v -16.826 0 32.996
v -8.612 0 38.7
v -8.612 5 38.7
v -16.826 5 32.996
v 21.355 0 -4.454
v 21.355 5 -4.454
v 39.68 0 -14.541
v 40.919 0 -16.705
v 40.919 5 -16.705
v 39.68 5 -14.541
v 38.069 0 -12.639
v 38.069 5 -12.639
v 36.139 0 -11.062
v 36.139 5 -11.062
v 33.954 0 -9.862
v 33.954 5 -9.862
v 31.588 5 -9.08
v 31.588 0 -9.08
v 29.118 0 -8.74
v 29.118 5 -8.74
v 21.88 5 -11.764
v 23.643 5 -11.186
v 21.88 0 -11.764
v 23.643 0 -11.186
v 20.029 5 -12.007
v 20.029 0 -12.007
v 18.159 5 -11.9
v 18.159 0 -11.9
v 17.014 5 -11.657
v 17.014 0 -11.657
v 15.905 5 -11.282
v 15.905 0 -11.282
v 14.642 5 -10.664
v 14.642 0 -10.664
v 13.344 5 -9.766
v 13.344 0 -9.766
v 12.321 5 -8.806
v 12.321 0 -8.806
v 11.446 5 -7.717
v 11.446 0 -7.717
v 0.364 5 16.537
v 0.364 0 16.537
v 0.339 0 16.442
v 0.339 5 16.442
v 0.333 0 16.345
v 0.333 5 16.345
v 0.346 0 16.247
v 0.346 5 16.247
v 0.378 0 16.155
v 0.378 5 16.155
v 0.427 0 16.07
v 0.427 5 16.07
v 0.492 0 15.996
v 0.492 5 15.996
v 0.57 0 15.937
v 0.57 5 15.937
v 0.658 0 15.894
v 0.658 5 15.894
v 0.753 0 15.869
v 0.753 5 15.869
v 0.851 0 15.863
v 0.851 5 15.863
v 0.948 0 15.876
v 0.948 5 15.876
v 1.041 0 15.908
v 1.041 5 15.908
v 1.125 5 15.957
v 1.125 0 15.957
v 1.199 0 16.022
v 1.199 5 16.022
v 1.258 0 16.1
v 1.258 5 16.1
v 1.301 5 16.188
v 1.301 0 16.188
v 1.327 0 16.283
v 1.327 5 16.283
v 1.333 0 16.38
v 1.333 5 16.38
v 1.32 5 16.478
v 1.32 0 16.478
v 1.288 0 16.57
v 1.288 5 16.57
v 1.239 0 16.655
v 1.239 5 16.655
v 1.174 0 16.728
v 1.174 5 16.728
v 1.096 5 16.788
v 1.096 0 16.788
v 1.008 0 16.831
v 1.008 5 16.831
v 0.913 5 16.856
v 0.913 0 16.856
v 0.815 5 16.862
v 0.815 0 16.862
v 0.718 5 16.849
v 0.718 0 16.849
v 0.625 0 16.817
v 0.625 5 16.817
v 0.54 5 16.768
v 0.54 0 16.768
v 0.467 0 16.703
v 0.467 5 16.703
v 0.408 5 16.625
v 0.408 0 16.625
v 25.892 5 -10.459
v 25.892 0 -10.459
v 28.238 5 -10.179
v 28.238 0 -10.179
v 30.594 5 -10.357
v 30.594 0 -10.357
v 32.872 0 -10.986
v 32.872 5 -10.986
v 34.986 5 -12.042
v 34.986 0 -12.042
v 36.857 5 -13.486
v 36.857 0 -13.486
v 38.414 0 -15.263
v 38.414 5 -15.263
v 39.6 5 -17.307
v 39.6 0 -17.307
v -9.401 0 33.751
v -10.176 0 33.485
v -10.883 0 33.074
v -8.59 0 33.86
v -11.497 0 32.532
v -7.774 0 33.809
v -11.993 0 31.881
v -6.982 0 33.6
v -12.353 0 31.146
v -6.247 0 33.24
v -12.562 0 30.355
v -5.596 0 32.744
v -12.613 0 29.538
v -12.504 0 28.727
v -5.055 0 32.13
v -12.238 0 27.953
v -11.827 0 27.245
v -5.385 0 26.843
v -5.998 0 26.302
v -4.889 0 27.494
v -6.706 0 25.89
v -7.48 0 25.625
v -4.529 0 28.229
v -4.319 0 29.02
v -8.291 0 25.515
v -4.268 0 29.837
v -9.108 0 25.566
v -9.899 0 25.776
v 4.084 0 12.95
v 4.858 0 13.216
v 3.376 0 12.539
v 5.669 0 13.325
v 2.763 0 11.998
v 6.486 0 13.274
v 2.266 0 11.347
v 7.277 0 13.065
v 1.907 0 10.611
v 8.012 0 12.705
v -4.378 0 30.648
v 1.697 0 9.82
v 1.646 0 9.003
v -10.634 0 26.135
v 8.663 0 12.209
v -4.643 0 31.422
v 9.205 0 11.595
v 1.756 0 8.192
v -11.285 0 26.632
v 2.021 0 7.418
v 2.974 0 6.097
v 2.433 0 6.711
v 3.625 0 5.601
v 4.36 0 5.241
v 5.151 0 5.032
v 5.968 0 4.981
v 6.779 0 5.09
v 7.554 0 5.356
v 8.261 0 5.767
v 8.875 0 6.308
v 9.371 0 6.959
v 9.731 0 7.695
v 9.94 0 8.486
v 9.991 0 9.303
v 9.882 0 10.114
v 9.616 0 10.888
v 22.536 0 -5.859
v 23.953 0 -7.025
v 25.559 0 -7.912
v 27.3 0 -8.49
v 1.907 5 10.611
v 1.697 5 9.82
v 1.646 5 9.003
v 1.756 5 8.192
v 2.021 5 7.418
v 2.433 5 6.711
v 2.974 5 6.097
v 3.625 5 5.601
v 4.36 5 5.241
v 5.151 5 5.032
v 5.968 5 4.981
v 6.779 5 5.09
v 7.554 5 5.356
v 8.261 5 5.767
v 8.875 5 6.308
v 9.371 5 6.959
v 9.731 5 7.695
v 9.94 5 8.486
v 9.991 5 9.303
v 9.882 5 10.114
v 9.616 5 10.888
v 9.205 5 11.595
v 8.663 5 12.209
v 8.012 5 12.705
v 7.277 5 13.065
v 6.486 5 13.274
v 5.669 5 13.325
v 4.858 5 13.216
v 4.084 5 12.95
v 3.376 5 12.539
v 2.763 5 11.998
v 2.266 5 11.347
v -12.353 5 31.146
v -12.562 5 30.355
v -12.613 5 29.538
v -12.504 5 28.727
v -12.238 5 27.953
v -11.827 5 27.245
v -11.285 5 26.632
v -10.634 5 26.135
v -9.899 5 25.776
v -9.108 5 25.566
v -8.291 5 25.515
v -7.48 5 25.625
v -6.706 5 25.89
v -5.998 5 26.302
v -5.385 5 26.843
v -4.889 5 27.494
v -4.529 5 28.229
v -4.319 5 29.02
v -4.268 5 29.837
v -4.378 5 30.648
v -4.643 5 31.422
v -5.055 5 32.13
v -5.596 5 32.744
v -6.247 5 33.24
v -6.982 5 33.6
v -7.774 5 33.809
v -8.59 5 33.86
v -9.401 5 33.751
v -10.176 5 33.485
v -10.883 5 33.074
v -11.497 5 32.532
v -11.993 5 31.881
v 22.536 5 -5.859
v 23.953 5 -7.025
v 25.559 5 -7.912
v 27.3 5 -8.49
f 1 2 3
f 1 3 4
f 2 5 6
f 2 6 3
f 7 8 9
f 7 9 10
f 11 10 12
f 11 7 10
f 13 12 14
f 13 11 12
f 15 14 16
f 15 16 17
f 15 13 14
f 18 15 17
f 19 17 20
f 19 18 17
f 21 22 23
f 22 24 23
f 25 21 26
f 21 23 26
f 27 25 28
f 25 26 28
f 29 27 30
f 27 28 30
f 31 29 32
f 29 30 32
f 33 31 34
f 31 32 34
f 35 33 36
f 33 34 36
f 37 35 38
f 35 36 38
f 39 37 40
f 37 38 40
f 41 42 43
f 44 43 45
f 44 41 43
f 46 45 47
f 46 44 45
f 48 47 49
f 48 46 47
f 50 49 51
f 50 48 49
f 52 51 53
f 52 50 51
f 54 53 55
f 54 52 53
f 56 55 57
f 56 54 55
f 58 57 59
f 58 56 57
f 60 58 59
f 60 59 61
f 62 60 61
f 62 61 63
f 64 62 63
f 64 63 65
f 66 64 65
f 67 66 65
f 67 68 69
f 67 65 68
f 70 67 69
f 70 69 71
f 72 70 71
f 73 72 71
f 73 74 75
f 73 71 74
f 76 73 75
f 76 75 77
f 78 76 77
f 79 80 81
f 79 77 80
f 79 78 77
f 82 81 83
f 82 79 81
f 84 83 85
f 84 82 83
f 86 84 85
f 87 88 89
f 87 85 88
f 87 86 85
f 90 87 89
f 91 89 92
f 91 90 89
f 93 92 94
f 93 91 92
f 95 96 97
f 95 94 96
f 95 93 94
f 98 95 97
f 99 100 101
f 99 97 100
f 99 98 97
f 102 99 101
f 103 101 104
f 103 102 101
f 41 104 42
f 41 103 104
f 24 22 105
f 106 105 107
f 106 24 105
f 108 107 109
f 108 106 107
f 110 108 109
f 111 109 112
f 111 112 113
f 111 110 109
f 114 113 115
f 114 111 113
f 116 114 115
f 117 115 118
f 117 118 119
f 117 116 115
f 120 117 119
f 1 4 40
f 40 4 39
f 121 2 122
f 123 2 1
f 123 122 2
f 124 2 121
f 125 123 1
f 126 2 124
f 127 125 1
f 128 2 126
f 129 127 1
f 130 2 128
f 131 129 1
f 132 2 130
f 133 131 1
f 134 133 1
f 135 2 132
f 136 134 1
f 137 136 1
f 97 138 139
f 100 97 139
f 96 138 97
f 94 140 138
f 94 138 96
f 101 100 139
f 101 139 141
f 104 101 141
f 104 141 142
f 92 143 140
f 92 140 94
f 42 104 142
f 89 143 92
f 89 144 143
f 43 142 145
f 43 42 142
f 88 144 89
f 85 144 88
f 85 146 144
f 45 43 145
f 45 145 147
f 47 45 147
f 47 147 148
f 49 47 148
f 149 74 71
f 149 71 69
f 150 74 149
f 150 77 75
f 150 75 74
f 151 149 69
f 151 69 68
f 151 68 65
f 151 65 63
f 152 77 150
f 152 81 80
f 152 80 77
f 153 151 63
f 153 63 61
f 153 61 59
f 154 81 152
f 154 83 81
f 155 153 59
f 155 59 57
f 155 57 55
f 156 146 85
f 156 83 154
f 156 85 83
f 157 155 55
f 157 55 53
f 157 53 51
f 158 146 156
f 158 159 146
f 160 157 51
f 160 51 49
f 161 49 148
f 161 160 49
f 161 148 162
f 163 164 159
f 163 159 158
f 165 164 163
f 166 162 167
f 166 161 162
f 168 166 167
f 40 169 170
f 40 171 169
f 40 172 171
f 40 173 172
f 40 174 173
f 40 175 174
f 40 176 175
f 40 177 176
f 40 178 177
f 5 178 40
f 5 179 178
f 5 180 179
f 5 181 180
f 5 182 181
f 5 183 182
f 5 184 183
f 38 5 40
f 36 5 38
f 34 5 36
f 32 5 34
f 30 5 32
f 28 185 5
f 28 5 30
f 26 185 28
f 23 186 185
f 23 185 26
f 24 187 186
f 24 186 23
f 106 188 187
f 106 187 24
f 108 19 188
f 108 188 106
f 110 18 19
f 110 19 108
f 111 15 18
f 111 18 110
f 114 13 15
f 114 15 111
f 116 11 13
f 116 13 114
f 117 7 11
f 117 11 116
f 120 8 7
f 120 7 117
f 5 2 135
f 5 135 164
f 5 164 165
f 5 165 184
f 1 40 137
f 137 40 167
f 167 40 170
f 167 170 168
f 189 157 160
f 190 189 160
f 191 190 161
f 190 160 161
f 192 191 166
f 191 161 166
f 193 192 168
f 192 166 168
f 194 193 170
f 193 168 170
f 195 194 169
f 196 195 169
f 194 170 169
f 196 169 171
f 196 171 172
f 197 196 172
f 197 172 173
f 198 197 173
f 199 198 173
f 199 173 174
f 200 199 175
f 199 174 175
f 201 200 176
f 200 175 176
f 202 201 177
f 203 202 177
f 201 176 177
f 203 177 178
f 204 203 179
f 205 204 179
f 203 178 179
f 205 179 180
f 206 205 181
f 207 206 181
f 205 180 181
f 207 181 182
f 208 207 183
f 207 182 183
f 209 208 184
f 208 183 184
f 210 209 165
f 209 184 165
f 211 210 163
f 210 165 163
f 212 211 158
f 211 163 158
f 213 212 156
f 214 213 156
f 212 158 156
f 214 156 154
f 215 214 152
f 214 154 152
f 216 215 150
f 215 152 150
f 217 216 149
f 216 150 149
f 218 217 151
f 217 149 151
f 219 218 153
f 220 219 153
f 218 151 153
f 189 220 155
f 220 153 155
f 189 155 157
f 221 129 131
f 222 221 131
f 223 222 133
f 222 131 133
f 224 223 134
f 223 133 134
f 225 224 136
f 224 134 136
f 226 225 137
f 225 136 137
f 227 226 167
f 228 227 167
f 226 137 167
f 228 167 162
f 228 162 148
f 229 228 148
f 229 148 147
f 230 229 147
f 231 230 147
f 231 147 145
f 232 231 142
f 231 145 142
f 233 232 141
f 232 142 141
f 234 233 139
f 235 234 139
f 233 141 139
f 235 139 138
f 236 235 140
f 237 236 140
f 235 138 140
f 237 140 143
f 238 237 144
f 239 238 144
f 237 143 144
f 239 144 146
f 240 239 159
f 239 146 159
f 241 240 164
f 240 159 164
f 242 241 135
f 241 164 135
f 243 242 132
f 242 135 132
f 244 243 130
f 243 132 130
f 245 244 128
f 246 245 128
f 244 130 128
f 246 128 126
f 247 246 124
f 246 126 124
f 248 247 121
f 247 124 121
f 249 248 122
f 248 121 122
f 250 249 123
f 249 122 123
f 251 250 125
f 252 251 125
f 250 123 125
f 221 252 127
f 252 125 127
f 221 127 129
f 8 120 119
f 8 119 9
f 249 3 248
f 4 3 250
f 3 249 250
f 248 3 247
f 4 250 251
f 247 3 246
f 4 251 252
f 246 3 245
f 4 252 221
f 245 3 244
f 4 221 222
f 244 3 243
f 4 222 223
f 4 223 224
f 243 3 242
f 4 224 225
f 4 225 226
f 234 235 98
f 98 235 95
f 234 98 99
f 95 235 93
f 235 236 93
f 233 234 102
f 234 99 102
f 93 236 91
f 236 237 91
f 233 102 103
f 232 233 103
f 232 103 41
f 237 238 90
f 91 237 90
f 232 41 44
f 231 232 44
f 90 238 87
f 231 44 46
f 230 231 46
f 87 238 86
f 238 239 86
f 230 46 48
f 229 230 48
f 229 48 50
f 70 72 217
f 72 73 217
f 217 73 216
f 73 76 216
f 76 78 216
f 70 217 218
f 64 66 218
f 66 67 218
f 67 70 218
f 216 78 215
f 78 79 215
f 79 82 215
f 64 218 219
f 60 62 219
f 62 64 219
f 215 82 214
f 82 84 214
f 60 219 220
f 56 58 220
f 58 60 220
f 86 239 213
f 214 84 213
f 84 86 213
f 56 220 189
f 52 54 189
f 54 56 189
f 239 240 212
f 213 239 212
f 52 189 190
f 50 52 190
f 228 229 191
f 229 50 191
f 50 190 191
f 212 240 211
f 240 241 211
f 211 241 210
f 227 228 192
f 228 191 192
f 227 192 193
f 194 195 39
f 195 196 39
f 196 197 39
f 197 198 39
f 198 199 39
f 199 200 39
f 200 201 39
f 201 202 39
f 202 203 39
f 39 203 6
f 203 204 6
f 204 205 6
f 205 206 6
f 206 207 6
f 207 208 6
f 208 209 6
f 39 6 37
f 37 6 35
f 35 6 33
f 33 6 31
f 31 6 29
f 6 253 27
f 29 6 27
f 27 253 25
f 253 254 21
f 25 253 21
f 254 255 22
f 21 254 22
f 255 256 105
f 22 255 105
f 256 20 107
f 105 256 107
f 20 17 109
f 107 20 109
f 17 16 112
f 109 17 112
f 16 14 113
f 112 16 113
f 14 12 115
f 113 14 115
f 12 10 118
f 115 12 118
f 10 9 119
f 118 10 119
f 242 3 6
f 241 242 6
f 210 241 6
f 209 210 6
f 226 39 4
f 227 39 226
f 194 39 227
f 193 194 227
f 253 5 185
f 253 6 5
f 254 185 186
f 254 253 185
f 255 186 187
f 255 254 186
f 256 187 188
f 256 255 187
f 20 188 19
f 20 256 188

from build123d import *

# Parameters (mm, degrees)
SKETCH_2_R          = 4.175
EXTRUDE_1_DEPTH     = 5
FILLET_1_R          = 20
SKETCH_6_R          = 0.5000000000000009
CUT_EXTRUDE_3_DEPTH = 47.17452492507412
FILLET_2_R          = 10
CUT_EXTRUDE_4_DEPTH = 57.542041070345505
FILLET_3_R          = 10


with BuildPart() as part:
    # ｽｹｯﾁ2 → ﾎﾞｽ - 押し出し1 (new body)
    with BuildSketch(Plane(origin=(0, 0, 0), x_dir=(1, 0, 0), z_dir=(0, 1, 0))):
        with BuildLine():
            Line((8.269872578160966, 20.67530348178248), (-25.039362549658698, -27.29226699202151))
            Line((-25.039362549658694, -27.292266992021514), (-16.82553632293364, -32.996042821869985))
            Line((-16.82553632293364, -32.996042821869985), (16.77540554807104, 15.391605258271007))
            ThreePointArc((16.775405548070047, 15.39160525826554), (17.036467269075846, 15.346625845237856), (17.298352710232226, 15.306721140237647))
            Line((17.29835271023301, 15.306721140243175), (12.453720459223167, 18.670889747549086))
            ThreePointArc((12.453720459220065, 18.67088974754445), (7.082723548852389, 27.619577165201054), (10.596791286456618, 37.44698487250789))
            Line((10.596791286456803, 37.44698487250808), (9.571486453740173, 38.47228970522472))
            ThreePointArc((9.571486453736274, 38.47228970522862), (5.609855036074267, 29.81593956245965), (8.269872578156503, 20.675303481779164))
        make_face()
        with Locations(Location((-2.3951779892886145, -3.4492196700893225, 0), (0, 0, 270))):
            Circle(SKETCH_2_R, mode=Mode.SUBTRACT)
        with Locations(Location((-16.654617563909806, -23.98378523690196, 0), (0, 0, 270))):
            Circle(SKETCH_2_R, mode=Mode.SUBTRACT)
    extrude_1 = extrude(amount=EXTRUDE_1_DEPTH)

    # ﾌｨﾚｯﾄ1
    # the kernel refuses this fillet: 20 mm, written as the material it adds along each edge
    with BuildSketch(Plane(origin=(16.775405548070545, 0, -15.391605258268275), x_dir=(-0.5703775829850781, 0, 0.8213826226723454), z_dir=(0, 1, 0))) as fillet_1_piece_1_section:
        with BuildLine():
            CenterArc((4.1176832280817175, 20.000000000000004), FILLET_1_R, 257.44880249712094, 12.55119750289515)
            Line((-0.22855499889395509, 0.4779557096502993), (-0.31547976343346945, 0.08751482384330647))
            ThreePointArc((-0.31547976343346945, 0.08751482384330647), (-0.47282168846060246, 0.06752459028858156), (-0.36414407682378114, -0.16552670876373804))
            Line((-0.36414407682378114, -0.16552670876373804), (1.117e-13, -0.3999999999999987))
            Line((1.117e-13, -0.3999999999999987), (4.117683228087442, -0.39999999999999974))
            Line((4.117683228087442, -0.39999999999999974), (4.117683228087329, 1.7e-16))
        make_face()
    fillet_1_piece_1 = extrude(amount=5, mode=Mode.PRIVATE)
    fillet_1_piece_1 = split(fillet_1_piece_1, bisect_by=Plane(origin=(16.82290798810791, 2.5, -15.63687544831251), z_dir=(-0.570377582984848, 0, 0.8213826226725052)), keep=Keep.TOP, mode=Mode.PRIVATE)
    add(fillet_1_piece_1)
    with BuildSketch(Plane(origin=(8.269872578158733, 0, -20.675303481780823), x_dir=(-0.5703775829847766, 0, 0.8213826226725548), z_dir=(0, 1, 0))) as fillet_1_piece_2:
        with BuildLine():
            CenterArc((10.285673470537454, -20.000000000000007), FILLET_1_R, 89.99999999999505, 43.641913313262535)
            Line((-3.5173087138816013, -5.526656128709918), (-3.7933683575699813, -5.237189251284115))
            ThreePointArc((-3.7933683575699813, -5.237189251284115), (-1.7596460761489088, -2.7626969082759216), (-0.3791309613113661, 0.1275135842768152))
            Line((-0.3791309613113661, 0.1275135842768152), (3.413e-14, 0.40000000000000013))
            Line((3.413e-14, 0.40000000000000013), (10.285673470539217, 0.4000000000000006))
            Line((10.285673470539217, 0.4000000000000006), (10.285673470539184, -6e-17))
        make_face()
    extrude(amount=5)

    # ｽｹｯﾁ6 → ｶｯﾄ - 押し出し3 (cut, through all)
    with BuildSketch(Plane(origin=(0, 5, 0), x_dir=(1, 0, 0), z_dir=(0, 1, 0))):
        with Locations(Location((-7.408738509451215, -10.639307664730705, 0), (0, 0, 270))):
            Circle(SKETCH_6_R)
    cut_extrude_3 = extrude(amount=-CUT_EXTRUDE_3_DEPTH, mode=Mode.SUBTRACT)

    # ﾌｨﾚｯﾄ2
    fillet_2_edges = [part.edges().sort_by_distance(p)[0] for p in [
        (17.29835271023262, 2.5, -15.30672114024041),
    ]]
    fillet(fillet_2_edges, radius=FILLET_2_R)

    # ﾐﾗｰ1: ﾎﾞｽ - 押し出し1, ｶｯﾄ - 押し出し3 across plane
    add(extrude_1.mirror(Plane(origin=(4.106913113362459, 5, 2.8518879149242107), x_dir=(-0.5703775829848504, 0, 0.8213826226725034), z_dir=(-0.8213826226725035, 0, -0.5703775829848503))))
    add(cut_extrude_3.mirror(Plane(origin=(4.106913113362459, 5, 2.8518879149242107), x_dir=(-0.5703775829848504, 0, 0.8213826226725034), z_dir=(-0.8213826226725035, 0, -0.5703775829848503))), mode=Mode.SUBTRACT)

    # ｽｹｯﾁ7 → ｶｯﾄ - 押し出し4 (cut, through all)
    with BuildSketch(Plane(origin=(0, 5, 0), x_dir=(1, 0, 0), z_dir=(0, 1, 0))):
        Polygon((-16.825536322933814, -32.99604282186991), (31.619002207822653, 36.767396870690376), (6.63537695599359, 54.116314892564866), (-41.809161574762875, -15.647124799995419), align=None)
    extrude(amount=-CUT_EXTRUDE_4_DEPTH, mode=Mode.SUBTRACT)

    # ﾌｨﾚｯﾄ3
    fillet_3_edges = [part.edges().sort_by_distance(p)[0] for p in [
        (24.69752503161028, 2.5, -9.267751822082793),
        (16.905768195919187, 2.5, -15.579336362687311),
        (21.357815932613555, 2.5, -12.487782977823219),
    ]]
    fillet(fillet_3_edges, radius=FILLET_3_R)


solid = part.part
